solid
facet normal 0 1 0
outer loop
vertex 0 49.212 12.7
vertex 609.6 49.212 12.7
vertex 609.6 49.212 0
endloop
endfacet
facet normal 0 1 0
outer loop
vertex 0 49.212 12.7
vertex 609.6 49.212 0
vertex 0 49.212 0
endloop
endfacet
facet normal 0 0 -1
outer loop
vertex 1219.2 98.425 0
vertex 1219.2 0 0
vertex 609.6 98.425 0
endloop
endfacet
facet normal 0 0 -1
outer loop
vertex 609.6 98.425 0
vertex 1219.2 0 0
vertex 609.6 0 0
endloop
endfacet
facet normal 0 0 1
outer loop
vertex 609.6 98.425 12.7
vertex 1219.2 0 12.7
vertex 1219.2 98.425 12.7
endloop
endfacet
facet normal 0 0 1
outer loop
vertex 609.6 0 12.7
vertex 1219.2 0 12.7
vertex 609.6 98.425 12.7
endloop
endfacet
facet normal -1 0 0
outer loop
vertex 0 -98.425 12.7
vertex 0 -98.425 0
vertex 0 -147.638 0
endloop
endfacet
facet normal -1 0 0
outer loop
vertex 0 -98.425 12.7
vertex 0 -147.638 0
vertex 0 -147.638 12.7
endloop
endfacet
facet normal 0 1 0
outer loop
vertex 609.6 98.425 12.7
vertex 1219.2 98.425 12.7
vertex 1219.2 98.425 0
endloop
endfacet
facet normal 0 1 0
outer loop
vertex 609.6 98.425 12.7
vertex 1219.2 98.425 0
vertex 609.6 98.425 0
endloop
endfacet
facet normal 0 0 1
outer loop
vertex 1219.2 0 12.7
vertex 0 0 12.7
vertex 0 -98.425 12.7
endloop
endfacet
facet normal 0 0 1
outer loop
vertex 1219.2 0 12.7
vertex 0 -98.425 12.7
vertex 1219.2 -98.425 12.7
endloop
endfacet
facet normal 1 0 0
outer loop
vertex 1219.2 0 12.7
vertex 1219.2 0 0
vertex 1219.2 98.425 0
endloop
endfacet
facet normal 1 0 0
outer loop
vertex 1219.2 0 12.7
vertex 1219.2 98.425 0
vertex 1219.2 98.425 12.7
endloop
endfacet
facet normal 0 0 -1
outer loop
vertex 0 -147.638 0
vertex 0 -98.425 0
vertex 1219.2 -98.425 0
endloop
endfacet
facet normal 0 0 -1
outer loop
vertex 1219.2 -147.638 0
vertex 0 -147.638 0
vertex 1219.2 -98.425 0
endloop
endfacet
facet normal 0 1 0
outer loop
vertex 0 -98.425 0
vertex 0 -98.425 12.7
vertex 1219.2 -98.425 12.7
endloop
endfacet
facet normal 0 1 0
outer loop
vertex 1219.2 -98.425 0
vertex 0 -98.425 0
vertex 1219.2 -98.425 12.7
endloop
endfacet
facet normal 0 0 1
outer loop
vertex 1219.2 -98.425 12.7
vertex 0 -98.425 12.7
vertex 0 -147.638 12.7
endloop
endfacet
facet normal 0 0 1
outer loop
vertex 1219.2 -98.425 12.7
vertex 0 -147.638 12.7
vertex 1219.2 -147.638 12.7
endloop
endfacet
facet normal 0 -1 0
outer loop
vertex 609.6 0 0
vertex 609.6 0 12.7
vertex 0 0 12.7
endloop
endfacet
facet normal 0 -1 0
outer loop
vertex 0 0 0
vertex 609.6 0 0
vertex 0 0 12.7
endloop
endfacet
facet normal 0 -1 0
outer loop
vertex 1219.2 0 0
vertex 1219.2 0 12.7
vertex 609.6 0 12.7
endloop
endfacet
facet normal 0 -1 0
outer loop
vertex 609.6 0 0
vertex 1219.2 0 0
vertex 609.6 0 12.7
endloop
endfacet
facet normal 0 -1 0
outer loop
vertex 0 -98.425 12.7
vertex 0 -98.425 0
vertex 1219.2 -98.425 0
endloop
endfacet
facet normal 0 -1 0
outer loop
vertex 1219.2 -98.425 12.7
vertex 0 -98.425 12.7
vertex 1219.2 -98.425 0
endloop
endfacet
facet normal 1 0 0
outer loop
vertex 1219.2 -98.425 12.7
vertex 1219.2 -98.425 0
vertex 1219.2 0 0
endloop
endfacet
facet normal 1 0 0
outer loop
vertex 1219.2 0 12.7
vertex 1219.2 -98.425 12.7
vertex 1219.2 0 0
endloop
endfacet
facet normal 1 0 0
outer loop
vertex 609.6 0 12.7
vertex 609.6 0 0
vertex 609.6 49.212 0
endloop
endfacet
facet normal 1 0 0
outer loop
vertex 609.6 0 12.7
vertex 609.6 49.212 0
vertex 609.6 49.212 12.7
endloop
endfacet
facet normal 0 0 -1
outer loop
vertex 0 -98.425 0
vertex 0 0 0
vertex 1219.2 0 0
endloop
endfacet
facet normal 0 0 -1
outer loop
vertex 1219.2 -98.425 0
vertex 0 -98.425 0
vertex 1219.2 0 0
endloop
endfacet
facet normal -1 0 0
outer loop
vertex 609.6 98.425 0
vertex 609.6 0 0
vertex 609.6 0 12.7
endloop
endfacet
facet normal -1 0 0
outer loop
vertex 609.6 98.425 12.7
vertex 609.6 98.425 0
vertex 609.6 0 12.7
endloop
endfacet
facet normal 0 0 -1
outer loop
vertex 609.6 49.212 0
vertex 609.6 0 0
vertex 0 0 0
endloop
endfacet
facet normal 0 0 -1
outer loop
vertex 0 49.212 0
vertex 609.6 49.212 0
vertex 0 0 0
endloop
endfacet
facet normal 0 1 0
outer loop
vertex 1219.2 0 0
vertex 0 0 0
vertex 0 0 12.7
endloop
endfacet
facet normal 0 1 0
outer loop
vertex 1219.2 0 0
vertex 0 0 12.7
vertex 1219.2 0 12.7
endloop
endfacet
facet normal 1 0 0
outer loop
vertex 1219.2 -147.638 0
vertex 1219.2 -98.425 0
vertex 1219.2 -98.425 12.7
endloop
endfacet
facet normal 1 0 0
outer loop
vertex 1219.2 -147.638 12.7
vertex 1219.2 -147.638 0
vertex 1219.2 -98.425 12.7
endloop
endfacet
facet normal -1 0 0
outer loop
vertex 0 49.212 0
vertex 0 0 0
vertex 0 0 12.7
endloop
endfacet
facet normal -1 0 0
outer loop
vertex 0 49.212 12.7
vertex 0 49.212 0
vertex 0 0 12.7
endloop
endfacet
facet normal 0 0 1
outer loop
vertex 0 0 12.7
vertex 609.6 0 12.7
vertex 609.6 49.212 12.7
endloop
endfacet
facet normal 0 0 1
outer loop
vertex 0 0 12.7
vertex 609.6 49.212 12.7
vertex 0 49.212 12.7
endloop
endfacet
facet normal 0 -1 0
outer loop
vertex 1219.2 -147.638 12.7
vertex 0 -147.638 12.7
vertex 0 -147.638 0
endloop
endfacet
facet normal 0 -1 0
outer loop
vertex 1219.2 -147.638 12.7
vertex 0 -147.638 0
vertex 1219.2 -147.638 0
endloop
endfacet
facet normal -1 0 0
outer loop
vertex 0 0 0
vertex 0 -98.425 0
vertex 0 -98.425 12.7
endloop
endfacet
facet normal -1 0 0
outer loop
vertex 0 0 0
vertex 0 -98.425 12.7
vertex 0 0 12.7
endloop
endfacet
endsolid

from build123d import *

# Parameters (mm, degrees)
F0_W     = 1219.2
F0_H     = 98.425
F1_DEPTH = 12.7
F2_W     = 1219.2
F2_H     = 12.7
F3_DEPTH = 49.2125
F4_W     = 609.6
F4_H     = 12.7
F5_DEPTH = 98.425
F6_W     = 609.6
F6_H     = 12.7
F7_DEPTH = 49.2125


with BuildPart() as f1:
    # F0 (on Top) → F1 (new body)
    with BuildSketch(Plane.XY):
        with Locations((609.6, -49.2125)):
            Rectangle(F0_W, F0_H)
    extrude(amount=F1_DEPTH)


with BuildPart() as f3:
    # F2 (on face) → F3 (new body)
    with BuildSketch(Plane.XZ.offset(98.425)):
        with Locations((609.6, 6.35)):
            Rectangle(F2_W, F2_H)
    extrude(amount=F3_DEPTH)


with BuildPart() as f5:
    # F4 (on face) → F5 (new body)
    with BuildSketch(Plane(origin=(0, 0, 0), x_dir=(-1, 0, 0), z_dir=(0, 1, 0))):
        with Locations((-914.4, 6.35)):
            Rectangle(F4_W, F4_H)
    extrude(amount=F5_DEPTH)


with BuildPart() as f7:
    # F6 (on face) → F7 (new body)
    with BuildSketch(Plane(origin=(0, 0, 0), x_dir=(-1, 0, 0), z_dir=(0, 1, 0))):
        with Locations((-304.8, 6.35)):
            Rectangle(F6_W, F6_H)
    extrude(amount=F7_DEPTH)


solid = Compound([f1.part, f3.part, f5.part, f7.part])
